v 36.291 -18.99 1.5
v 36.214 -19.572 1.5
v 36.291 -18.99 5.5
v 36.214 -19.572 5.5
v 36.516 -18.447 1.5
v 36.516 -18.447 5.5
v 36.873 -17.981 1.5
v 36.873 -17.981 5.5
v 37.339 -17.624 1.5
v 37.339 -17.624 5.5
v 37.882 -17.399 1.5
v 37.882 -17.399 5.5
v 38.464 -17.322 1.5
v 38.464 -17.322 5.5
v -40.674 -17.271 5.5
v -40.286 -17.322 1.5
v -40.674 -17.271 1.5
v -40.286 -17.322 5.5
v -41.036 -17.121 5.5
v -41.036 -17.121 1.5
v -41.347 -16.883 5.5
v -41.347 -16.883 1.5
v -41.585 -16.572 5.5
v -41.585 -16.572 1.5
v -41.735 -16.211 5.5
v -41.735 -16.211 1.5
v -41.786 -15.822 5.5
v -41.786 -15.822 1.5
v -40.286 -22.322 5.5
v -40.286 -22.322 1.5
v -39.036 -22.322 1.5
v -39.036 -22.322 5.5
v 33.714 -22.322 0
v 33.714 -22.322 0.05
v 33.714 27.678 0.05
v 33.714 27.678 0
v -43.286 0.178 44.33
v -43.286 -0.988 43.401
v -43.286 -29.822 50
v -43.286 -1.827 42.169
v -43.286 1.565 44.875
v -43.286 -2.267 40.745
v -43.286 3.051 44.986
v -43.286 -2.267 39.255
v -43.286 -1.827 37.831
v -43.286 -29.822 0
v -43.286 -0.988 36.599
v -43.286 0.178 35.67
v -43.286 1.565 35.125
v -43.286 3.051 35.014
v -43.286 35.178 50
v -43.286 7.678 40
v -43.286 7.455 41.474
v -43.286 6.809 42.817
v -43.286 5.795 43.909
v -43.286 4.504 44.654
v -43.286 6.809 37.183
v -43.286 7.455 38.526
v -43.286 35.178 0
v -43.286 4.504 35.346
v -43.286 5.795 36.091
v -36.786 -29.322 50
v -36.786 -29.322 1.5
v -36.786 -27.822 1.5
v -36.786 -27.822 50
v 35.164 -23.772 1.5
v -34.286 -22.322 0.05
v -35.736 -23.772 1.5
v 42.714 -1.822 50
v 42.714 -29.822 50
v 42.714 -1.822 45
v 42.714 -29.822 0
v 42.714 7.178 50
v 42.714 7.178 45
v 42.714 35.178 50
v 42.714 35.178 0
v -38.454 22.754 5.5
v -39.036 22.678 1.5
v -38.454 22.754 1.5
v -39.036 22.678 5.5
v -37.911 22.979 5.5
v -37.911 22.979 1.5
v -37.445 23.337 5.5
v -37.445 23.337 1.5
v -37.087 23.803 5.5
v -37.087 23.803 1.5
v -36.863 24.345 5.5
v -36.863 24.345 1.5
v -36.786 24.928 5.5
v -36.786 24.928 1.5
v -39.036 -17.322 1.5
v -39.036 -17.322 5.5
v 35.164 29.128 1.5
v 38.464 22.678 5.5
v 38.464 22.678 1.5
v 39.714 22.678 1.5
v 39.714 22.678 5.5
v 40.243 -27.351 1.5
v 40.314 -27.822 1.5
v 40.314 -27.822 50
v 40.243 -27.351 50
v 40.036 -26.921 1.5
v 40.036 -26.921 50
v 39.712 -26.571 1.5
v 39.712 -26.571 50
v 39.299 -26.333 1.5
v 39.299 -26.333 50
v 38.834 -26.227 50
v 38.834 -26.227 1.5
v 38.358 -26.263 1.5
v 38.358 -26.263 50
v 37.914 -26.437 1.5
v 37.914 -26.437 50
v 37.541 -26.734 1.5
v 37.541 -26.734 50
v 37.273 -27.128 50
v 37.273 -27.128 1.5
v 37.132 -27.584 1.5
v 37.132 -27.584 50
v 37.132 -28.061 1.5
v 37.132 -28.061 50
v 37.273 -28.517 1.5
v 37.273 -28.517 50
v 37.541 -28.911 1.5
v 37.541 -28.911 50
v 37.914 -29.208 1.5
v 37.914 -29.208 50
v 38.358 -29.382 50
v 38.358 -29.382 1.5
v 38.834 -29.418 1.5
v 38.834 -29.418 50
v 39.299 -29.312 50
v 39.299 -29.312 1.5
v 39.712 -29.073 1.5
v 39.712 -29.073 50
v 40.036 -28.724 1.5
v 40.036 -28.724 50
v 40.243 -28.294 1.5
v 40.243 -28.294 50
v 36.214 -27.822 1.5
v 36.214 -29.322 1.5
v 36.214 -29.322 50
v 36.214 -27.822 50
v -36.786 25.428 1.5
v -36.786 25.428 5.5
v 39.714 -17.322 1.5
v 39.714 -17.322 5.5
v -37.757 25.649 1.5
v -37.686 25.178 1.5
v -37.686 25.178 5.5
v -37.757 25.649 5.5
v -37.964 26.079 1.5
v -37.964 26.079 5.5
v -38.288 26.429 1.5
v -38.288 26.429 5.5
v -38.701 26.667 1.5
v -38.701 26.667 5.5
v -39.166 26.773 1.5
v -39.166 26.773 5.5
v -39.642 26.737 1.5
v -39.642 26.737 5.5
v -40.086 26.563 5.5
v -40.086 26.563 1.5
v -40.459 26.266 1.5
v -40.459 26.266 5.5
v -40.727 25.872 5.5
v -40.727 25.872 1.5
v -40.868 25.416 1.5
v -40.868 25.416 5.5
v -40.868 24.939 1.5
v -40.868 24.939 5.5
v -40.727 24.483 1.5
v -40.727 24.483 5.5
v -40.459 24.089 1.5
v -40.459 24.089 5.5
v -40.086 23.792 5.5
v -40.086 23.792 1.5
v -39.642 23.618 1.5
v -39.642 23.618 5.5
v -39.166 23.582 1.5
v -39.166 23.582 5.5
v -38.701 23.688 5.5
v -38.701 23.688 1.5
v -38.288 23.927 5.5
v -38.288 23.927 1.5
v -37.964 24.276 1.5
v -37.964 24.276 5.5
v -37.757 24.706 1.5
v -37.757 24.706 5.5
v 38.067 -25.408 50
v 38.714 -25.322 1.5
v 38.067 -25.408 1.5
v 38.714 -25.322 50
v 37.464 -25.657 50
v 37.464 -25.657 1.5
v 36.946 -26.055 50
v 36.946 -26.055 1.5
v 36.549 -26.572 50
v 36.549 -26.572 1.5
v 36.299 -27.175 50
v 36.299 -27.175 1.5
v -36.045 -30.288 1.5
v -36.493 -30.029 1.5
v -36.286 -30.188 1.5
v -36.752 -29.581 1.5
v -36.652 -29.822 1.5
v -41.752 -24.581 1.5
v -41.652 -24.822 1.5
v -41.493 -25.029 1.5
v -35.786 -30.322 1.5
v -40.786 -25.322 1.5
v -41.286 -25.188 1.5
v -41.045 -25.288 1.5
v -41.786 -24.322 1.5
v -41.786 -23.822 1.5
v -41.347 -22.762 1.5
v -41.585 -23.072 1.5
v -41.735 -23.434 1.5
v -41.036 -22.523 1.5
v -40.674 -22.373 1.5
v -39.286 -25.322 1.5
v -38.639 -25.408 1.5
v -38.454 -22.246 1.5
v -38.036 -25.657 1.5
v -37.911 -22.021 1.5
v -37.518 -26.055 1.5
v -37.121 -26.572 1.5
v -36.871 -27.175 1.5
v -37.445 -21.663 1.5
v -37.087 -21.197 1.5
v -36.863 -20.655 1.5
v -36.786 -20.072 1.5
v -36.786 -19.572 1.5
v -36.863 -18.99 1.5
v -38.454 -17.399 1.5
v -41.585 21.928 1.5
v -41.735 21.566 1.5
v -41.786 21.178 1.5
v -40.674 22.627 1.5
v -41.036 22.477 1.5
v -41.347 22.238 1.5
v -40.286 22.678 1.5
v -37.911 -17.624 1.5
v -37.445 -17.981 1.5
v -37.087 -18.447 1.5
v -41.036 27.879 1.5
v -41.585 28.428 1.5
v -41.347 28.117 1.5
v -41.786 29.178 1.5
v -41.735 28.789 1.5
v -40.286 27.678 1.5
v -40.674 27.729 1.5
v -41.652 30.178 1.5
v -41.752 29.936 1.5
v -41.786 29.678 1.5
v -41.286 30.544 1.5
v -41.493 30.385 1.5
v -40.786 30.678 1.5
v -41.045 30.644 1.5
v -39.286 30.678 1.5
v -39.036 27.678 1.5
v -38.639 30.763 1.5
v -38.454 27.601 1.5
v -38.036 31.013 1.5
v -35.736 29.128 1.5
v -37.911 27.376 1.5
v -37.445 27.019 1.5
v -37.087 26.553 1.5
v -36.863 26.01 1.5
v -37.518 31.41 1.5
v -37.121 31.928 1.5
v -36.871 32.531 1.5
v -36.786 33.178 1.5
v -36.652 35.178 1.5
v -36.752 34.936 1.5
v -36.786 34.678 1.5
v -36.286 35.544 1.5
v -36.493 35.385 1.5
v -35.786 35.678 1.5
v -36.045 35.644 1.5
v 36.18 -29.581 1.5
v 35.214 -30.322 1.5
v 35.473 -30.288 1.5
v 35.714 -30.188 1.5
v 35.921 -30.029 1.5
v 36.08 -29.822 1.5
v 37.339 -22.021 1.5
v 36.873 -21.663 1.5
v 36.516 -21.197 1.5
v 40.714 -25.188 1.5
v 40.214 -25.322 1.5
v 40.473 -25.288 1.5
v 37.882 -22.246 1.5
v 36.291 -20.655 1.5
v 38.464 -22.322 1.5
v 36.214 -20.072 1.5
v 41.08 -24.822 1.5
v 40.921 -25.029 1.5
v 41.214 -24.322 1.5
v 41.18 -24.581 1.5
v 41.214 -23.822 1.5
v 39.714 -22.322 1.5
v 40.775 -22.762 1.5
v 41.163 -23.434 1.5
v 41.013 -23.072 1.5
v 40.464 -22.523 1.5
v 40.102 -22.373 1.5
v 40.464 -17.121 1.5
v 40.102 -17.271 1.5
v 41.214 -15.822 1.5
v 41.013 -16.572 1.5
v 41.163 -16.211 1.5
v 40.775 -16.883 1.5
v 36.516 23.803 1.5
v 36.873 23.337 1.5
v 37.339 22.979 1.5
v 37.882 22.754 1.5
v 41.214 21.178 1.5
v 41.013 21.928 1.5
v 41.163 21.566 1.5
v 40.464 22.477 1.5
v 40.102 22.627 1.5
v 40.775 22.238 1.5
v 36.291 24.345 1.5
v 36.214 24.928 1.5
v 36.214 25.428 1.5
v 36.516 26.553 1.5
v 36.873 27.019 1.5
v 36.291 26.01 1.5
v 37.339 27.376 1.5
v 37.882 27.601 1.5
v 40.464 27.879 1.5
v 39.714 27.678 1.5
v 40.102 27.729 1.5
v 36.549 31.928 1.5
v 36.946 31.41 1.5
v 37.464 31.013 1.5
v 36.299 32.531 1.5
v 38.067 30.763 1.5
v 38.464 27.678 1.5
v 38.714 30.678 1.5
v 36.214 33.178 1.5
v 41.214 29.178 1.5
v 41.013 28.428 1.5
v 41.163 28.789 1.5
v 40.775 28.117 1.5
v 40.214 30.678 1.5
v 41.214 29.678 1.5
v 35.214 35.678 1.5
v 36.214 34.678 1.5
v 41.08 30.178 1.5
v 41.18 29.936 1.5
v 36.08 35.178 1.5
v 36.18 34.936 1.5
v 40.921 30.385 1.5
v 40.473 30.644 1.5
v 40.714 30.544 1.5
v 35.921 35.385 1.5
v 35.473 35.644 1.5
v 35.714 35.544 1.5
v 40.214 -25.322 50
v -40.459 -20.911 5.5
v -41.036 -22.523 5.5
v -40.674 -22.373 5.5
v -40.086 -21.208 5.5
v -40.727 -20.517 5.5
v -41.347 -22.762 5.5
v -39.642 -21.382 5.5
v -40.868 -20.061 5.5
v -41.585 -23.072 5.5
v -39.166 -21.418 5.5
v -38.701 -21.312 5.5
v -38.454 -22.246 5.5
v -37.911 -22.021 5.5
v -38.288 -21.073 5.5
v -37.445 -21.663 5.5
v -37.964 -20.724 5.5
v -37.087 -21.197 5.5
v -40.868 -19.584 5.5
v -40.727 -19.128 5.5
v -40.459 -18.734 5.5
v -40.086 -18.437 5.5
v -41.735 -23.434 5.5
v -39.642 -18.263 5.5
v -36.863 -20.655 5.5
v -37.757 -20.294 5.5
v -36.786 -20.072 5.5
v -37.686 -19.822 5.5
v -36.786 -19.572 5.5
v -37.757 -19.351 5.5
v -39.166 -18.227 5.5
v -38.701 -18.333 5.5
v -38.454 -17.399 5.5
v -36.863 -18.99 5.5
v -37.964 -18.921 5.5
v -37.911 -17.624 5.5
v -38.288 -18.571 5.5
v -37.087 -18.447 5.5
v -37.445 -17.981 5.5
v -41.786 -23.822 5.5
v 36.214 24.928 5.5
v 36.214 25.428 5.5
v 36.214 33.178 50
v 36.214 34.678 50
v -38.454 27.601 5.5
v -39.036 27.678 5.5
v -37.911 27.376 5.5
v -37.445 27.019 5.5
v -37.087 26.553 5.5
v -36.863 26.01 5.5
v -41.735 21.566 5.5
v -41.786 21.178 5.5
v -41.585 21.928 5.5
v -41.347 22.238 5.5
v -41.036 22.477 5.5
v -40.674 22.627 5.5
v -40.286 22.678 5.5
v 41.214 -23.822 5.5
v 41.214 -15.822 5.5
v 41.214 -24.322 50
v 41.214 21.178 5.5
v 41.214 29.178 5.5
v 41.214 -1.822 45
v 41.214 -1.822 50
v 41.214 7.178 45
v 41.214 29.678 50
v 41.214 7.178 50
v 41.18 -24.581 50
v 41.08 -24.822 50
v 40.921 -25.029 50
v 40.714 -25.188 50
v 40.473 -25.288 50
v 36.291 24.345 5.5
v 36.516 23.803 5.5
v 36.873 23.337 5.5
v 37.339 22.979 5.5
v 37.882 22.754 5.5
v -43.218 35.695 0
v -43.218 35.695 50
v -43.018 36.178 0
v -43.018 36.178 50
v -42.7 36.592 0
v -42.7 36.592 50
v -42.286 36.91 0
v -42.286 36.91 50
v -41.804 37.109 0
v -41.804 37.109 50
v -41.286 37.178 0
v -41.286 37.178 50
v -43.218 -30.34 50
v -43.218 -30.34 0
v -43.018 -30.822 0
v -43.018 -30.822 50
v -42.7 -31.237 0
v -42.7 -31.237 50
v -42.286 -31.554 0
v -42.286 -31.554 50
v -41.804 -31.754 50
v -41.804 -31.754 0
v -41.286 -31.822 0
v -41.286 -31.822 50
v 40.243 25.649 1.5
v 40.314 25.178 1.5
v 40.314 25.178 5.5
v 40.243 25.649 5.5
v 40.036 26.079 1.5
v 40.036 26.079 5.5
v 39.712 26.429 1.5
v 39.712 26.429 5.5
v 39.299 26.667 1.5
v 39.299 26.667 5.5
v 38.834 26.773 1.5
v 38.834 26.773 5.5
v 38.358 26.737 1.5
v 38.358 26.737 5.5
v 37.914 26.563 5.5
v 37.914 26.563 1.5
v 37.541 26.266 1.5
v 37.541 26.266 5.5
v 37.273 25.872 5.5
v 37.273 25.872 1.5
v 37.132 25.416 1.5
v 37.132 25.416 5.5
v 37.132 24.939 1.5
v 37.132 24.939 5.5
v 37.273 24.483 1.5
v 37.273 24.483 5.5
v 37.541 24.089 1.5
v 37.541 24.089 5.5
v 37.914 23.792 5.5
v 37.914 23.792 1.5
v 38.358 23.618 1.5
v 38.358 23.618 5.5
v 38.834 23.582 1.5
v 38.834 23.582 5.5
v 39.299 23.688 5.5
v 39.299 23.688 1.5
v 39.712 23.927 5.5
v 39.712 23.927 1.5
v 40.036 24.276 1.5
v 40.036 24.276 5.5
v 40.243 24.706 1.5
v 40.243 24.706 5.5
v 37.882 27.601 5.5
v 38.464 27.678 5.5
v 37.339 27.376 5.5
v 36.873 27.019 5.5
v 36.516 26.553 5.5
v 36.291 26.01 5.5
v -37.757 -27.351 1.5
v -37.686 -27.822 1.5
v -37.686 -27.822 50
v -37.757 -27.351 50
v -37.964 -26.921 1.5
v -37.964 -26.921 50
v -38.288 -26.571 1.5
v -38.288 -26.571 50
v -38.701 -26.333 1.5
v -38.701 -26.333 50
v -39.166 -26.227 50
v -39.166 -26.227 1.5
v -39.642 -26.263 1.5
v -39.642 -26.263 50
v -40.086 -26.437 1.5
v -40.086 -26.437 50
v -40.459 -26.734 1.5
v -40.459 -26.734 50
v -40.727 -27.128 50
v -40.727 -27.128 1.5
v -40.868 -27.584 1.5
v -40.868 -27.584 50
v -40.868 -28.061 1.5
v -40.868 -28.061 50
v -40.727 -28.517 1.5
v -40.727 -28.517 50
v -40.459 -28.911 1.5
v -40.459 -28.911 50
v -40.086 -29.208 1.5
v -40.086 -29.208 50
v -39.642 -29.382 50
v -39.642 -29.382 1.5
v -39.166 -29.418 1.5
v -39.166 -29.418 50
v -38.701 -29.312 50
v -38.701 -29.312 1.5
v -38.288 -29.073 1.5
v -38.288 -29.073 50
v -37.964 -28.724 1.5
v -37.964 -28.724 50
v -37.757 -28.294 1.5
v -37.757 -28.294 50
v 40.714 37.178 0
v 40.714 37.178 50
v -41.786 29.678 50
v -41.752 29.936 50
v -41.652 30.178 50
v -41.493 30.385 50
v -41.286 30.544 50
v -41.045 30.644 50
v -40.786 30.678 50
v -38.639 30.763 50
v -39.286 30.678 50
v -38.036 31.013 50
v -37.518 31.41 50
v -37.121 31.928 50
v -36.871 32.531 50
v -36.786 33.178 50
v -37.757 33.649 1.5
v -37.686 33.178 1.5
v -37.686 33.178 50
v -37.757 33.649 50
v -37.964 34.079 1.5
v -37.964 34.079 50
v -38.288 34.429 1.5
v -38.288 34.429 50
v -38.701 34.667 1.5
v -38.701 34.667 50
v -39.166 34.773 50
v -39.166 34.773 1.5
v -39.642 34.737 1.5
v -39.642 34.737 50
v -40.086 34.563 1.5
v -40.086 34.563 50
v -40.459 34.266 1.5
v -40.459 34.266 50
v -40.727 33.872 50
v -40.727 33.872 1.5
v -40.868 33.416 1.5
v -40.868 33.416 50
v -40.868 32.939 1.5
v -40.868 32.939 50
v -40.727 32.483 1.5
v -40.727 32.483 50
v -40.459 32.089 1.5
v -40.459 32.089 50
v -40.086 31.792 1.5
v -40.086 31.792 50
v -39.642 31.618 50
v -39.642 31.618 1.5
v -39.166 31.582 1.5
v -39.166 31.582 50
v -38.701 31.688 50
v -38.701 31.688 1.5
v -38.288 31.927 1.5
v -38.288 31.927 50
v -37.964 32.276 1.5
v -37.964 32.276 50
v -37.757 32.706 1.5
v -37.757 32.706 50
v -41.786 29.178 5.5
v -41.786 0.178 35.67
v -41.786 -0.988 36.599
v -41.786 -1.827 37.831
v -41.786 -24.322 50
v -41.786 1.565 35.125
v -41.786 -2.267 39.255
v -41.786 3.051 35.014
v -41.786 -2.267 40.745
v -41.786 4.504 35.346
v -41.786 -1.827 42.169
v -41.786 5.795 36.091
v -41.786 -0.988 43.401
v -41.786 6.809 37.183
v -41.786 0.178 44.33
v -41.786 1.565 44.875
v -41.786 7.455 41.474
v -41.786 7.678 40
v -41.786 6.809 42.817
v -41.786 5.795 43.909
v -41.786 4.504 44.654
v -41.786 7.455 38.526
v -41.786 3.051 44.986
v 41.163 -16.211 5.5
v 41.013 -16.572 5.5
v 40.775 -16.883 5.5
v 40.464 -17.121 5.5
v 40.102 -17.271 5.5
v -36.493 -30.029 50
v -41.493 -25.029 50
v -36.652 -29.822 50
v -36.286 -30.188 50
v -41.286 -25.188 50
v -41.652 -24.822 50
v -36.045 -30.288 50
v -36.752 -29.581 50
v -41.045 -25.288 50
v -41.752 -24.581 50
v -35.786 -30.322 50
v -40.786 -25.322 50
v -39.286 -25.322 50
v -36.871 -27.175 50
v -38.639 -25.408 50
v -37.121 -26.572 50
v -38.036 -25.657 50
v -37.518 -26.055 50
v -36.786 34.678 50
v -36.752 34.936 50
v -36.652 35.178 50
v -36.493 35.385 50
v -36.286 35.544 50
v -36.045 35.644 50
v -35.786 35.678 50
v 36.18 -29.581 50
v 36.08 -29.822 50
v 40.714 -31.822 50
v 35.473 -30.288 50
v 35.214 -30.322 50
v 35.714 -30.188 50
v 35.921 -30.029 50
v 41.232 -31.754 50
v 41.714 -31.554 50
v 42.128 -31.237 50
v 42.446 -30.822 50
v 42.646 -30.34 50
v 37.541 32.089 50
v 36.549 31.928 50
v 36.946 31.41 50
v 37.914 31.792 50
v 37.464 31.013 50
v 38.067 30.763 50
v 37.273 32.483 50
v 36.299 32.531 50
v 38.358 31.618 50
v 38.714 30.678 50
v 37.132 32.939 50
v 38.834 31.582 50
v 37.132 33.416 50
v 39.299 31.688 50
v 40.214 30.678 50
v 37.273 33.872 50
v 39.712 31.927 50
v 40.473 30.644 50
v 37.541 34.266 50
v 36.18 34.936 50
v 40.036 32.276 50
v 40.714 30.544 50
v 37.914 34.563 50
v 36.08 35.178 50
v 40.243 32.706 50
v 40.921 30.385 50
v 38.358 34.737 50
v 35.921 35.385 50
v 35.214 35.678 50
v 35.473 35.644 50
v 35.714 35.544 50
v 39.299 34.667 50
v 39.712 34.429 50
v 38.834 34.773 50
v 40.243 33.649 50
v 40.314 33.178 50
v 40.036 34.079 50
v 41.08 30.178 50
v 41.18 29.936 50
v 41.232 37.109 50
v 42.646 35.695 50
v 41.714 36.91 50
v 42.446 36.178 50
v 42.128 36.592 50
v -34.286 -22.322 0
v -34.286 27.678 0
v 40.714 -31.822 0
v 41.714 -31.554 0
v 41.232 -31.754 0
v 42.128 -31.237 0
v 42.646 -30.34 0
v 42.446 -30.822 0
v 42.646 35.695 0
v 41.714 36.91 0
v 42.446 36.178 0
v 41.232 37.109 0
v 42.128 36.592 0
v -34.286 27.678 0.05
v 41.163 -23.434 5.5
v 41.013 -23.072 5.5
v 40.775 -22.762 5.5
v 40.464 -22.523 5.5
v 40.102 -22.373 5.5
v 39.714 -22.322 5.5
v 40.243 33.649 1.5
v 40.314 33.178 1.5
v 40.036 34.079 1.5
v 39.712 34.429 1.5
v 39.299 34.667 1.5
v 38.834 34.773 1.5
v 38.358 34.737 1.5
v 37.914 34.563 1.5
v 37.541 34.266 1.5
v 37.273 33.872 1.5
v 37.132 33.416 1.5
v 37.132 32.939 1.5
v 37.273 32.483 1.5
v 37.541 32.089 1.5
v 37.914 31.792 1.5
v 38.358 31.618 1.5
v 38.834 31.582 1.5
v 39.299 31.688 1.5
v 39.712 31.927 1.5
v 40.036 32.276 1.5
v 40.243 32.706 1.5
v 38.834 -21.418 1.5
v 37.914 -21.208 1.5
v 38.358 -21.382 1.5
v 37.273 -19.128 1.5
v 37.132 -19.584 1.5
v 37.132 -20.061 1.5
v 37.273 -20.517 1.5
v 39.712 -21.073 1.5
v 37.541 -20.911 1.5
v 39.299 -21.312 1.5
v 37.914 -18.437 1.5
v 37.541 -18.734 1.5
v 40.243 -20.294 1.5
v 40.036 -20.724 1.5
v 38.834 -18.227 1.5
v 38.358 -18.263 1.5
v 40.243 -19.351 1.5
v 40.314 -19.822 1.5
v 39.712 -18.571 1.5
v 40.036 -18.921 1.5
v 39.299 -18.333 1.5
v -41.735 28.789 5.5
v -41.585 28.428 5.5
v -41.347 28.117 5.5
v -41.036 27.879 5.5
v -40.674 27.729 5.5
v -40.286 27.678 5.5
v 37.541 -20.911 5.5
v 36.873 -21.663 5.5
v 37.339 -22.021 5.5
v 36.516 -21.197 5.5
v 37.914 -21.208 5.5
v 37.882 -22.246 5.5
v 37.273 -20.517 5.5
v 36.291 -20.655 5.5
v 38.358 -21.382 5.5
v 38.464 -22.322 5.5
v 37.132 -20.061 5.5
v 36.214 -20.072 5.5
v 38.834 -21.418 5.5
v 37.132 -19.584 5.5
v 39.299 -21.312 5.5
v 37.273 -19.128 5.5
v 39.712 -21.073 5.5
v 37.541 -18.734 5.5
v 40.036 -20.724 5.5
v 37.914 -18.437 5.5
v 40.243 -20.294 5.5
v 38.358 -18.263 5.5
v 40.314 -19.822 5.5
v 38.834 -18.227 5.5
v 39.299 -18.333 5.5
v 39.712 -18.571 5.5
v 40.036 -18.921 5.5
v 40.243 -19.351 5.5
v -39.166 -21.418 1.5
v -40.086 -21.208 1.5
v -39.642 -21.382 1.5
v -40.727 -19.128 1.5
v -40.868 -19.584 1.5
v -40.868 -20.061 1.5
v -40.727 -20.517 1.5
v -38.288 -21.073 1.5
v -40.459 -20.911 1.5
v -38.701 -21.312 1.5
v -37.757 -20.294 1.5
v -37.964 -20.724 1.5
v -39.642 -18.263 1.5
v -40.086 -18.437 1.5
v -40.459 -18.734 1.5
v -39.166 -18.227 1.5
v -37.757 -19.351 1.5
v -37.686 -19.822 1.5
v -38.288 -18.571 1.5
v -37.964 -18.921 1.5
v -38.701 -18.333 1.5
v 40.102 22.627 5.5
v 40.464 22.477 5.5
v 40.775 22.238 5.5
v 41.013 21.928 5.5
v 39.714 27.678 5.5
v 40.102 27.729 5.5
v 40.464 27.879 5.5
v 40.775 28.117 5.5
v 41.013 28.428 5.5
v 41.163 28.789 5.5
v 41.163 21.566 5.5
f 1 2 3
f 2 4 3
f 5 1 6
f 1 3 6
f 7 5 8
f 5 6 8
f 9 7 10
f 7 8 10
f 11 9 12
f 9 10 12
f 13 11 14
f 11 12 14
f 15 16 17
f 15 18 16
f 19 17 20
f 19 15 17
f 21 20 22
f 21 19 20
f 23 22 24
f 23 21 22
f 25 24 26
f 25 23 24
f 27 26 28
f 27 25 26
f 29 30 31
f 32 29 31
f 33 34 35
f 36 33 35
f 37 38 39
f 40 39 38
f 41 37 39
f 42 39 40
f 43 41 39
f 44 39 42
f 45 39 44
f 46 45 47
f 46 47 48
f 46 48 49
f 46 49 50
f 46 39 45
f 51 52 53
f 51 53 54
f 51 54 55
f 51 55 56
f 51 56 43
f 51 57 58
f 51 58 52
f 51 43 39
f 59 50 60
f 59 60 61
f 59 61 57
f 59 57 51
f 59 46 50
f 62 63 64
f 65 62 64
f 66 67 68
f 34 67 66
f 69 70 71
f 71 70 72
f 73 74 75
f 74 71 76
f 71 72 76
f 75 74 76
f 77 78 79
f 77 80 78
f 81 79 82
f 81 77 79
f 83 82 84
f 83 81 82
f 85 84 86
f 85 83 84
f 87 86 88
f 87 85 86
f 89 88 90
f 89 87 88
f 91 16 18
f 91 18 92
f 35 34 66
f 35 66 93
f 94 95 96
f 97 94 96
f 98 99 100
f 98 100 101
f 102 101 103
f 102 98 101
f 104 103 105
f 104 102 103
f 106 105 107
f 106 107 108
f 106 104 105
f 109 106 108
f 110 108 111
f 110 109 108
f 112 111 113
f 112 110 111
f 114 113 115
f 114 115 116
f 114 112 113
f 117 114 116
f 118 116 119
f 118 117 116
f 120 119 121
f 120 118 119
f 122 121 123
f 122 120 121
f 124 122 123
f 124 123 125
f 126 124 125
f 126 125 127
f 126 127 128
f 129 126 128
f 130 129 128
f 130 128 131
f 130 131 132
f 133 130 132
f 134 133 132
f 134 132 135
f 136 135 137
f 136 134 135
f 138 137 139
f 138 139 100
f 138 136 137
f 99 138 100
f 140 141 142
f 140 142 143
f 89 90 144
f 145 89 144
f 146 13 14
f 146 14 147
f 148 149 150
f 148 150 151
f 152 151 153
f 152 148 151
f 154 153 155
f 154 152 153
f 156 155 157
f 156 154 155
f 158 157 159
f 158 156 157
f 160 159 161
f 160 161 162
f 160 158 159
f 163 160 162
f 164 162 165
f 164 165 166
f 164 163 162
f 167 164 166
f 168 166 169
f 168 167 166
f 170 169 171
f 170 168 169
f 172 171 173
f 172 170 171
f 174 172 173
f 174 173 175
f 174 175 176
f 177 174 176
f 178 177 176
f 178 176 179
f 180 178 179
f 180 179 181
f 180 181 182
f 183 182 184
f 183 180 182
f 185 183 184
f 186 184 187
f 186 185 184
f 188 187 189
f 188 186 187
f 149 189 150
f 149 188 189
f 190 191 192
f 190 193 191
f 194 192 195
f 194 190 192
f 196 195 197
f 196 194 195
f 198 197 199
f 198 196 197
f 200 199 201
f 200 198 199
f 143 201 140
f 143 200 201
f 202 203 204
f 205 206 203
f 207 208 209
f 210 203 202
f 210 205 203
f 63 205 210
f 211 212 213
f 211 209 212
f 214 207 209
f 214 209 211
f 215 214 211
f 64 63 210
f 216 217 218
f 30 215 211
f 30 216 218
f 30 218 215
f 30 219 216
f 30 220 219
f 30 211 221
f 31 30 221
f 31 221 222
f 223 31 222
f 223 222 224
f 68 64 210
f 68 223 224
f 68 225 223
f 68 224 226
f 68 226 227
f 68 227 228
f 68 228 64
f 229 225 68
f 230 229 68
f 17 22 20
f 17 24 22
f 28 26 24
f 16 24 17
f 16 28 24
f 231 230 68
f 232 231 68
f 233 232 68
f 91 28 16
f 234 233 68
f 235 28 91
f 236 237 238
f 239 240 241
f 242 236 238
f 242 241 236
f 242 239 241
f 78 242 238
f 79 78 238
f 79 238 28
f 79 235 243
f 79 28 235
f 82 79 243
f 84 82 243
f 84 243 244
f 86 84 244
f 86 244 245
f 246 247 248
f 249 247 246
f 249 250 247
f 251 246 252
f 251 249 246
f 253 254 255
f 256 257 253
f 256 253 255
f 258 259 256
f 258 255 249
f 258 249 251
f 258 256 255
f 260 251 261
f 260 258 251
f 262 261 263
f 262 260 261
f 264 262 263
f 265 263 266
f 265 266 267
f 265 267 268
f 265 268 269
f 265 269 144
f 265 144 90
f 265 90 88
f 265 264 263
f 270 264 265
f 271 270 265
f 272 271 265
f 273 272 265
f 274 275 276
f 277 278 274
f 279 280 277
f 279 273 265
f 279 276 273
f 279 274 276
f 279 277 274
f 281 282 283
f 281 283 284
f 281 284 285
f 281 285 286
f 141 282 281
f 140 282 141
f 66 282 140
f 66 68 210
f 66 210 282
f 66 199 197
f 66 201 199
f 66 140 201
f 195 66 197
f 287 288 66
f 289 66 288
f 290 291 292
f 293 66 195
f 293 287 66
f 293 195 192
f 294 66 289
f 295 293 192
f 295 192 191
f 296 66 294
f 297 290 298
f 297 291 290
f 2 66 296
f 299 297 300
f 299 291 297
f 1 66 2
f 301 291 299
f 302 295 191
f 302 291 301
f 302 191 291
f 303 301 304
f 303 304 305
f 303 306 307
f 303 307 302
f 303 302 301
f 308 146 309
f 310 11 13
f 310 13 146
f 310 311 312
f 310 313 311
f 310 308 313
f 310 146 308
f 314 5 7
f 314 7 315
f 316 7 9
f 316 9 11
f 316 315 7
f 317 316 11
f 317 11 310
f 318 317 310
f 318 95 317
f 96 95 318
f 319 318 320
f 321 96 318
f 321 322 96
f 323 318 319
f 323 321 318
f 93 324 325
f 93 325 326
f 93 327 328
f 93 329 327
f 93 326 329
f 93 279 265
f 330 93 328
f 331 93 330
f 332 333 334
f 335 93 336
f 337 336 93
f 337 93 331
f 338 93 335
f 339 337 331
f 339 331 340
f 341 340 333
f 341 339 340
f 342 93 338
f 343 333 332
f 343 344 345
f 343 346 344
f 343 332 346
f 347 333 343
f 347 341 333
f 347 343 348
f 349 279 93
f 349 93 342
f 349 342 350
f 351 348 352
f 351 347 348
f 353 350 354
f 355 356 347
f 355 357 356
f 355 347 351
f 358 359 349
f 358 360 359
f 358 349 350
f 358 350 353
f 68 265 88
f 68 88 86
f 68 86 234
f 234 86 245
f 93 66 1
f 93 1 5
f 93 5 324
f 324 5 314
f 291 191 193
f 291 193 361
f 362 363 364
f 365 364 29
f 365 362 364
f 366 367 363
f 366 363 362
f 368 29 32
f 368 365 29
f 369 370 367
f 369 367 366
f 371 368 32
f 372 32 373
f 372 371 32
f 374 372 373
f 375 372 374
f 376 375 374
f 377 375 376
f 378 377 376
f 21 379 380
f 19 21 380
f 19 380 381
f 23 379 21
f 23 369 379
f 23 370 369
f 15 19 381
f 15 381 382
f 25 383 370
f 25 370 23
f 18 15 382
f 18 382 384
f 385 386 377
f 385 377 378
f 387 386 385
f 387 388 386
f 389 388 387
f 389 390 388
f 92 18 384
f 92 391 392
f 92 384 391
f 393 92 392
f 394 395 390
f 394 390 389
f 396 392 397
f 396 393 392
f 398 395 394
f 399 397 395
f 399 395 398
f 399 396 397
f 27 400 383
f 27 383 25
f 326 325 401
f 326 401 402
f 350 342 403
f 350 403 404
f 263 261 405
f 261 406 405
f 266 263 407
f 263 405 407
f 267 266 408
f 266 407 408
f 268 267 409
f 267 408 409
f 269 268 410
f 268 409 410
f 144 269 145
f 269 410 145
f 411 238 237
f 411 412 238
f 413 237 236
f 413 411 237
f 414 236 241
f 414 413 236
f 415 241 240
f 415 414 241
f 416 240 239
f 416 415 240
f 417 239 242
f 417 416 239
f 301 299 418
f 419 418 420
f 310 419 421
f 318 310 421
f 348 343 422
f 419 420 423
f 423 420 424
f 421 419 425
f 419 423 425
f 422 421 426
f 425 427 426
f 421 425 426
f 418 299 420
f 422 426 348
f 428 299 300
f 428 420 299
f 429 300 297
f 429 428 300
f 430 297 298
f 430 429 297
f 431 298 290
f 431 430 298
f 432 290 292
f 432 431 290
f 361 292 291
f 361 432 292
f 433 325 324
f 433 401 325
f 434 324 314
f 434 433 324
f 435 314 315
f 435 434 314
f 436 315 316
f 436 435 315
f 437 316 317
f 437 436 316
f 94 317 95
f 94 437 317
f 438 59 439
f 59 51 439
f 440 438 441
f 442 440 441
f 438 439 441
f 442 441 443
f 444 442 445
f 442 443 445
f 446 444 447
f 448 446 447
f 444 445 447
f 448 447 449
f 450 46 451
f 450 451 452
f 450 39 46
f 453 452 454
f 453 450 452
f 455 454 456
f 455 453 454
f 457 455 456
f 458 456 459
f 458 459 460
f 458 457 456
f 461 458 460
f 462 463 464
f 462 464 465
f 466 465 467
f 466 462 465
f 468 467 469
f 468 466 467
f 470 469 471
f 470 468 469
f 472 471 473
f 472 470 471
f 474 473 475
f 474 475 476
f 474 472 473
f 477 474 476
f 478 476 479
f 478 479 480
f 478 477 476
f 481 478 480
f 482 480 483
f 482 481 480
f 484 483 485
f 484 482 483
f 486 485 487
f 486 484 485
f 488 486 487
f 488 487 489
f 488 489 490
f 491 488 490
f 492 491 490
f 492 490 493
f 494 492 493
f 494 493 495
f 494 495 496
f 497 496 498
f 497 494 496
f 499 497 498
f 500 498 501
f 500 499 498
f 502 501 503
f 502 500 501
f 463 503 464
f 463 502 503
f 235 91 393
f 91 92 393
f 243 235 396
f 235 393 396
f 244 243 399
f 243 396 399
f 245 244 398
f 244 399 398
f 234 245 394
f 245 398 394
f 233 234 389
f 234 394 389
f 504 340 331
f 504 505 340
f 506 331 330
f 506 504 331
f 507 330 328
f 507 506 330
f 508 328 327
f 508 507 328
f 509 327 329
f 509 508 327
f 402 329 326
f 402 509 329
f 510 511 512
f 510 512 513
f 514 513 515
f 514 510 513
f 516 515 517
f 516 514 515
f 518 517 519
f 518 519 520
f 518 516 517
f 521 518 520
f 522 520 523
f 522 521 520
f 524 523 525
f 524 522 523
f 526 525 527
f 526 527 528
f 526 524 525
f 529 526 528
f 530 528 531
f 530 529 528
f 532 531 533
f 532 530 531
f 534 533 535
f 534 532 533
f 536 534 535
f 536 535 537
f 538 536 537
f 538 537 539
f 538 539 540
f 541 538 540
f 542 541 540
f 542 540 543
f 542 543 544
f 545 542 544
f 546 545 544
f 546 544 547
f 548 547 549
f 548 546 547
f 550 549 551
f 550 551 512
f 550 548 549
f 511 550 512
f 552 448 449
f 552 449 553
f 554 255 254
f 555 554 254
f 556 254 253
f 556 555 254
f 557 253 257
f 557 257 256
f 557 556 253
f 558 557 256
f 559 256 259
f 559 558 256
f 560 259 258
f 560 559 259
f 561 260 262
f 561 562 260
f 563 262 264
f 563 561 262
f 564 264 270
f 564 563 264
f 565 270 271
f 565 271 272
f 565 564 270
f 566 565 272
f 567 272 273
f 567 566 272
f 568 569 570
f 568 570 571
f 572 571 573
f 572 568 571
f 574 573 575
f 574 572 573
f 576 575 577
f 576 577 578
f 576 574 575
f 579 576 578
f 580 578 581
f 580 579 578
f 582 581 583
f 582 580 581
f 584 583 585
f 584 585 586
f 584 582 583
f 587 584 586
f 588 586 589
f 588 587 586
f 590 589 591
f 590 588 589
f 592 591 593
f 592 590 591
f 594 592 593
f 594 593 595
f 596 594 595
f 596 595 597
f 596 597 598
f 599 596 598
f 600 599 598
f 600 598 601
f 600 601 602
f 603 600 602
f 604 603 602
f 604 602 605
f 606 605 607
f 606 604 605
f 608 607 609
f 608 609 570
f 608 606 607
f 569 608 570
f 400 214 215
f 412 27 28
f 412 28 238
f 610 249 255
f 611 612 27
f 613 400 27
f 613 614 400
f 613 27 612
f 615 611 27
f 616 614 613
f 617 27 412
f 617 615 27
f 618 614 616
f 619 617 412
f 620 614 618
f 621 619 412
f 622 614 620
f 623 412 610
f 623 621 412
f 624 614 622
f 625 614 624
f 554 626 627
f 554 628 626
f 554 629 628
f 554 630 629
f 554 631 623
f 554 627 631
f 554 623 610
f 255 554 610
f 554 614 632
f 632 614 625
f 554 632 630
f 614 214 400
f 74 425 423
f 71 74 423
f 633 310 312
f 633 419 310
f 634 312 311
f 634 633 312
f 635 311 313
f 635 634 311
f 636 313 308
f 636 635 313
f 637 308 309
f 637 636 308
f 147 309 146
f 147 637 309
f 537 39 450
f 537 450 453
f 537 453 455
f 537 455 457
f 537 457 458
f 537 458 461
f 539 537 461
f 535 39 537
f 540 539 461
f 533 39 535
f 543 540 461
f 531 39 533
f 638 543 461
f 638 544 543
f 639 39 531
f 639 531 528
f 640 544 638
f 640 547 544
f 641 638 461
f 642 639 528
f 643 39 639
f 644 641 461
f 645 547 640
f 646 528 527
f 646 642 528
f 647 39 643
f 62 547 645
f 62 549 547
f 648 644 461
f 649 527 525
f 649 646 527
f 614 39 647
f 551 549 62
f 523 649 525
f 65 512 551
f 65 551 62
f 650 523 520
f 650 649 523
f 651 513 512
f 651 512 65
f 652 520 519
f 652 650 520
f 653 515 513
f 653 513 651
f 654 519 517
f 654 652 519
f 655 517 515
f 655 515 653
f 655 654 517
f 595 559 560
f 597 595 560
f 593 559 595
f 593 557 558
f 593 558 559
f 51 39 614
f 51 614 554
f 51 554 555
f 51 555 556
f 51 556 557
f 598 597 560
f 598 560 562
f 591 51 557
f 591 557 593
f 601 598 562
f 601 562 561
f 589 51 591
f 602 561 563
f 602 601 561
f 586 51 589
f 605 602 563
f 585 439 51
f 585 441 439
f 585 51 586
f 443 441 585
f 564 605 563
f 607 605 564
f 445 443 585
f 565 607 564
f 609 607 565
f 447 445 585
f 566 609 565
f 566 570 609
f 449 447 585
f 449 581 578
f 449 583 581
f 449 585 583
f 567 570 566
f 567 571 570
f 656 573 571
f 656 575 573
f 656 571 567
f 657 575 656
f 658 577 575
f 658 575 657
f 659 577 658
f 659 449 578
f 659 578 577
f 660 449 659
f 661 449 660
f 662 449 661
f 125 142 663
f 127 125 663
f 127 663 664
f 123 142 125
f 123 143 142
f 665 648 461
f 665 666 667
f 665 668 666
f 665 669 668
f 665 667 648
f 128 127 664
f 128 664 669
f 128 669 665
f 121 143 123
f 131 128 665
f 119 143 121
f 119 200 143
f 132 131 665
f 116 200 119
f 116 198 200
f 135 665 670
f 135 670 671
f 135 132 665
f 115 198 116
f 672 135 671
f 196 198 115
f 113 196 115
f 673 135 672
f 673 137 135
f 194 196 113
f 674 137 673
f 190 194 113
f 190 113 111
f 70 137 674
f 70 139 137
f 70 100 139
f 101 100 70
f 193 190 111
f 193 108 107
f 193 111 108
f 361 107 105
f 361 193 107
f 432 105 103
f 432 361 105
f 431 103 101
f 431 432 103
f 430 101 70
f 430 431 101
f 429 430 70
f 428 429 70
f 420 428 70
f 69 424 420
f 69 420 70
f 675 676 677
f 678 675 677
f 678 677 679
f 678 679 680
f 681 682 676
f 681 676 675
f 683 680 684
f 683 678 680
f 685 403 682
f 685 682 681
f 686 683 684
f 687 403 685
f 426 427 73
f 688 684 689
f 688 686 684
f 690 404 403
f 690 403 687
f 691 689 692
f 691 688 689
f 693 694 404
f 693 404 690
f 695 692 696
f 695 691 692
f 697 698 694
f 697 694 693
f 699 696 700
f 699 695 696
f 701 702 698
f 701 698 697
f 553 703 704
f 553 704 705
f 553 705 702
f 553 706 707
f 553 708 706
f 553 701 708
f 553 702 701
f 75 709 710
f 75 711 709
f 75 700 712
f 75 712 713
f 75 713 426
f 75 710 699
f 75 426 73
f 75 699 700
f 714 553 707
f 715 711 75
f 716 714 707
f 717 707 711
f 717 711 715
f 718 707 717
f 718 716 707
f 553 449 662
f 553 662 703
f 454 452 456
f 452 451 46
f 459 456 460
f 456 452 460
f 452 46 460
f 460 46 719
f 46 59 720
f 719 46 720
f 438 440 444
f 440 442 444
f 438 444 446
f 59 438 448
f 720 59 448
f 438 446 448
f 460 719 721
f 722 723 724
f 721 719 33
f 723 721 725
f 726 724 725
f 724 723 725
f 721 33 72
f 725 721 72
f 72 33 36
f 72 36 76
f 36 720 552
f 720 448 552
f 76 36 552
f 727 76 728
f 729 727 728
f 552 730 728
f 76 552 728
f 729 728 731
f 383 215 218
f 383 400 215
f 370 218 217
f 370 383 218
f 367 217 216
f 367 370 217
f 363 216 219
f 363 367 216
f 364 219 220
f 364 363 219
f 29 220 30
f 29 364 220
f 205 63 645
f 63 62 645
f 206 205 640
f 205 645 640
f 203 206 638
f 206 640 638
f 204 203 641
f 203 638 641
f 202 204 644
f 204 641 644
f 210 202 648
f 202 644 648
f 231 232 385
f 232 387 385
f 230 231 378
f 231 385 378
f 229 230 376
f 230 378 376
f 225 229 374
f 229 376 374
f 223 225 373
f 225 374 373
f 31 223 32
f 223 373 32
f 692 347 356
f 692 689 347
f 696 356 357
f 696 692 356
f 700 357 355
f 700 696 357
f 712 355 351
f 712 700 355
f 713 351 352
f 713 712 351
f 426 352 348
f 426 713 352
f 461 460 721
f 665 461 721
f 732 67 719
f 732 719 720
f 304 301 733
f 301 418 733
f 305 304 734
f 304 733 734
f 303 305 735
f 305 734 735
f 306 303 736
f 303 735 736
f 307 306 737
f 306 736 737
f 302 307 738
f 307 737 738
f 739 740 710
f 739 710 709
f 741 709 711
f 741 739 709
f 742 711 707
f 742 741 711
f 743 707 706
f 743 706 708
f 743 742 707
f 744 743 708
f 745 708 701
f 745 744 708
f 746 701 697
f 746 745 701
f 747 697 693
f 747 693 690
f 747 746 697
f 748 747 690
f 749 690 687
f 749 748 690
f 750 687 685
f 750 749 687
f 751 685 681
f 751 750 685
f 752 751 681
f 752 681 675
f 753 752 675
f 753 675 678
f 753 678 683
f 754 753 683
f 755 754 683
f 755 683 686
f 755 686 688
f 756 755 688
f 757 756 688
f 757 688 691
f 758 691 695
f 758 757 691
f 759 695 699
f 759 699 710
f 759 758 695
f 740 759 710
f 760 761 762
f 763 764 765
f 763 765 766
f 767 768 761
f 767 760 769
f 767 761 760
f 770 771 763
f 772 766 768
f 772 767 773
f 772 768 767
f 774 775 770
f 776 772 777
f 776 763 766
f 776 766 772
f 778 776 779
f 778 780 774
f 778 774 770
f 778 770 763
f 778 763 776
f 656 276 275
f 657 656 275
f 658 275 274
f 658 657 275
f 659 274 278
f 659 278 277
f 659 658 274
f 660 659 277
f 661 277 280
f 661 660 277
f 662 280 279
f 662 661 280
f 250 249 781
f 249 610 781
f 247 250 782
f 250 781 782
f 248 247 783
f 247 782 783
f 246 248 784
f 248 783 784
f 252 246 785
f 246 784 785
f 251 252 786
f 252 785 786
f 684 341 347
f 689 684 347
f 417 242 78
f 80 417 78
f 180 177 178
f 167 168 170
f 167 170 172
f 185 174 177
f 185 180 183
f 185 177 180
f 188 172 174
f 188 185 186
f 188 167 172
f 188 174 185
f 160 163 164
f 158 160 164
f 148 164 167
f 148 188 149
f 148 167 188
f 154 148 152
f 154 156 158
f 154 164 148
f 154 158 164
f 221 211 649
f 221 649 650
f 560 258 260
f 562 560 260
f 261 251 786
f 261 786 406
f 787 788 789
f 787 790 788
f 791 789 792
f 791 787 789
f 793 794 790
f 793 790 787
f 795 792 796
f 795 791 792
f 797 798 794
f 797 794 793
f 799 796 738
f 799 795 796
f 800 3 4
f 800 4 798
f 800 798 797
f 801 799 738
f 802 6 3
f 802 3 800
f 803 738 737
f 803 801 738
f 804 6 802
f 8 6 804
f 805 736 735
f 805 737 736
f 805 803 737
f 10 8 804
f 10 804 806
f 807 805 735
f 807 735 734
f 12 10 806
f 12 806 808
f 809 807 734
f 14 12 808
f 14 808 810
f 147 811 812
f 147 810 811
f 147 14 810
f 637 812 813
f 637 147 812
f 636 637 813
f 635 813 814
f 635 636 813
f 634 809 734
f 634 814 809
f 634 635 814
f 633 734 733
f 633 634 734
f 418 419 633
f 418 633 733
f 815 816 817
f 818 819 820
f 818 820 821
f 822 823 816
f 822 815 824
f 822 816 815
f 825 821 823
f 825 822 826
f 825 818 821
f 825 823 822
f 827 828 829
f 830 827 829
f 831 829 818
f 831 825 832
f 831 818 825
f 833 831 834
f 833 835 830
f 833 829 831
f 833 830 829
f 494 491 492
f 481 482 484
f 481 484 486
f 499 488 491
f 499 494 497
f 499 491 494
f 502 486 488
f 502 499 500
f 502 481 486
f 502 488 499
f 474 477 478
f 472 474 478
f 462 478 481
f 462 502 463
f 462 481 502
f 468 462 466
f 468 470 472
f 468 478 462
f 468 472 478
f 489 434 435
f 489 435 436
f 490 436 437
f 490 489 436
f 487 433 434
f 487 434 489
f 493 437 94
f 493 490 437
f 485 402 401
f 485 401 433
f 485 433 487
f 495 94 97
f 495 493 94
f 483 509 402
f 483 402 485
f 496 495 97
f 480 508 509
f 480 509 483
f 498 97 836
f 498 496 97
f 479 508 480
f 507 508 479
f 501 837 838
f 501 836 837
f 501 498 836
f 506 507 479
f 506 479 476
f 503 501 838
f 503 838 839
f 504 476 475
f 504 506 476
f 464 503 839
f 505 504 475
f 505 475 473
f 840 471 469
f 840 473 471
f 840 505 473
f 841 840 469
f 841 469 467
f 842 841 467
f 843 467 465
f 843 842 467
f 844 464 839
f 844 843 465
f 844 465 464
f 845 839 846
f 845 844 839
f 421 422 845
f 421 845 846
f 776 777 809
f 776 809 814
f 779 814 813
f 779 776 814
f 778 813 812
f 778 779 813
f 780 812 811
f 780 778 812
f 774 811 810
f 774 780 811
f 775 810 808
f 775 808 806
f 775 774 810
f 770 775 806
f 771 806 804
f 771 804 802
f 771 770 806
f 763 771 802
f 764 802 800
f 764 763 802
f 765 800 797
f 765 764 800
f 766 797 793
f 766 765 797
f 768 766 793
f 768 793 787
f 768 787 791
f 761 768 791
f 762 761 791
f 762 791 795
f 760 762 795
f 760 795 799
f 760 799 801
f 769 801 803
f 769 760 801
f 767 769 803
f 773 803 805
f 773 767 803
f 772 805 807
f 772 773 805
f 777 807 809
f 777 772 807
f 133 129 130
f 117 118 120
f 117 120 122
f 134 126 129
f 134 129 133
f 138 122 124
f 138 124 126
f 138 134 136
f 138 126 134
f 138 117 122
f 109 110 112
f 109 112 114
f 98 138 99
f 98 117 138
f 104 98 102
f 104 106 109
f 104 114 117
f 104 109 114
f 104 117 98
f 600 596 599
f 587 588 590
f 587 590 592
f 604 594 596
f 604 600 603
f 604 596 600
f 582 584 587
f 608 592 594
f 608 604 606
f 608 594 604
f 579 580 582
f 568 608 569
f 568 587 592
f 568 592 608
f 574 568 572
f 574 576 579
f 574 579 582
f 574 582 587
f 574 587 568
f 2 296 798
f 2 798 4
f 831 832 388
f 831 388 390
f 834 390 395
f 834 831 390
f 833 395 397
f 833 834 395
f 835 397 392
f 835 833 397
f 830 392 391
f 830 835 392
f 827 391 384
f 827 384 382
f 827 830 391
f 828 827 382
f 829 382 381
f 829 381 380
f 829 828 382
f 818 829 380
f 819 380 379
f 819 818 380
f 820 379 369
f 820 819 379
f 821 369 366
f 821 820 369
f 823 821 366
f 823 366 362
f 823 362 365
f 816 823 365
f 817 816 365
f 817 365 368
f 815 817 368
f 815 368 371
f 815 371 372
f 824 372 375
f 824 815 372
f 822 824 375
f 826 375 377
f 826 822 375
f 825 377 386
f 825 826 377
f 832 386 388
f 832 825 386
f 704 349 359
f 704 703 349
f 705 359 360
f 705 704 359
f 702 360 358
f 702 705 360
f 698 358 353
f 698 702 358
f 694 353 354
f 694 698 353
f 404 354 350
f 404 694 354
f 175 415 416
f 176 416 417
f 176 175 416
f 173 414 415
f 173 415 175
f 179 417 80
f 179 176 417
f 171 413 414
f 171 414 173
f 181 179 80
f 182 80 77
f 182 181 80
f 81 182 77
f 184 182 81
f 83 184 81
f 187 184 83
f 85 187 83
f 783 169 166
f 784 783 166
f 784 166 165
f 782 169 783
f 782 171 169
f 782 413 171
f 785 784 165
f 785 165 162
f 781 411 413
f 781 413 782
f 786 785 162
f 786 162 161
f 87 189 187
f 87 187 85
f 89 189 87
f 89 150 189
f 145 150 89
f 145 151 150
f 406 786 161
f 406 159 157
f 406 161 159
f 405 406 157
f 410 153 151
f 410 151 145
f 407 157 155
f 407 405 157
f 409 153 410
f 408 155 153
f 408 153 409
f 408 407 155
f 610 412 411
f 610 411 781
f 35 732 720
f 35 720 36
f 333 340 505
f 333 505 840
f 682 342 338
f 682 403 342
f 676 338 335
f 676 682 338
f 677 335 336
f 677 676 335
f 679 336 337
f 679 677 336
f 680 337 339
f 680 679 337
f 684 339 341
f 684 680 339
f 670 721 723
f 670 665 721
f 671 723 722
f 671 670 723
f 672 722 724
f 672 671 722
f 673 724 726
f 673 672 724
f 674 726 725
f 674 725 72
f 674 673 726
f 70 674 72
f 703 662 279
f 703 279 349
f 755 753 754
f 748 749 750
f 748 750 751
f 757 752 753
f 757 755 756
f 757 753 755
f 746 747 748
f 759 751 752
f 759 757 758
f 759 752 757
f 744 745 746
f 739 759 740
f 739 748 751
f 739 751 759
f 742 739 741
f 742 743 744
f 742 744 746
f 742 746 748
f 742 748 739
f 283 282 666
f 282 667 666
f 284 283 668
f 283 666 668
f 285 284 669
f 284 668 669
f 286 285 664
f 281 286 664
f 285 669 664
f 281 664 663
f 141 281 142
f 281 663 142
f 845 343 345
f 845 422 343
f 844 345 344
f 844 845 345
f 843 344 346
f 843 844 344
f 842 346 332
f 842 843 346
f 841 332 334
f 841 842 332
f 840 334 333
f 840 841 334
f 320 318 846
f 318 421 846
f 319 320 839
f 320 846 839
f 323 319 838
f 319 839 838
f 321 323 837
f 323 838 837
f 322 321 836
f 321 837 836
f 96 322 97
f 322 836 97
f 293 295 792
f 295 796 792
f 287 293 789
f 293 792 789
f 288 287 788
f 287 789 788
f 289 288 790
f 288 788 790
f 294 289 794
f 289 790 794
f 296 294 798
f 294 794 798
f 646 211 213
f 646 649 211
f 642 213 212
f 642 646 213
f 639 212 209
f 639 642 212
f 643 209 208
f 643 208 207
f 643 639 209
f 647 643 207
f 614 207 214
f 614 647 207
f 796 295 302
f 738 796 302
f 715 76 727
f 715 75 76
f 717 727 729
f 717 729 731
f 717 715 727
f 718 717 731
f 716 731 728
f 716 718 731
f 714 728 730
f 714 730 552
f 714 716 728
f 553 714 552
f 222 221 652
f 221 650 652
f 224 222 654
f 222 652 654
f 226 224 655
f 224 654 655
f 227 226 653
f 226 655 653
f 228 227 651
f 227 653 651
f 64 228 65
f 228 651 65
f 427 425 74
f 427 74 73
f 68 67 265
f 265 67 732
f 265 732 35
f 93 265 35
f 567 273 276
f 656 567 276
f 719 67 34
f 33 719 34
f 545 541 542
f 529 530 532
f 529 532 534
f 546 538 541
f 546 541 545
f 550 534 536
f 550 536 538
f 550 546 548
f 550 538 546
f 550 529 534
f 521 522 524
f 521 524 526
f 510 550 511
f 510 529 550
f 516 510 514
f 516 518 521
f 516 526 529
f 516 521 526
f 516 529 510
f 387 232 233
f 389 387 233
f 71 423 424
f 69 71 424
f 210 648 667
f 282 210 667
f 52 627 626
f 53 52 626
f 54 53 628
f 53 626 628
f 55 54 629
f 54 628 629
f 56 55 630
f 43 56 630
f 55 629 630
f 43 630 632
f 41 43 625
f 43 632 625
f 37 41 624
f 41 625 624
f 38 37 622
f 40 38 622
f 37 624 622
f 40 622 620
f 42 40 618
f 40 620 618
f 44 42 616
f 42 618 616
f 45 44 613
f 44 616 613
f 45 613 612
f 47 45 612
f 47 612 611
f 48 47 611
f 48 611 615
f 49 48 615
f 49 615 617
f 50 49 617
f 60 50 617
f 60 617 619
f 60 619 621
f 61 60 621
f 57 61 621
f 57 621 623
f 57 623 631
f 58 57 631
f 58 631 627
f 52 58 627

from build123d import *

# Parameters (mm, degrees)
SKETCH_W        = 86
SKETCH_H        = 69
PAD_DEPTH       = 50
SKETCH001_W     = 83
SKETCH001_H     = 66
POCKET_DEPTH    = 48.5
SKETCH002_W     = 68
SKETCH002_H     = 50
POCKET001_DEPTH = 5
SKETCH003_W     = 5
SKETCH003_H     = 5
SKETCH003_R     = 1.6
PAD001_DEPTH    = 4
FILLET_R        = 2.25
FILLET001_R     = 2.25
FILLET002_R     = 1.5
SKETCH004_W     = 5
SKETCH004_H     = 5
SKETCH004_R     = 1.6
PAD002_DEPTH    = 48.5
FILLET003_R     = 2.5
FILLET004_R     = 1
FILLET005_R     = 2
CHAMFER_SIZE    = 1.45
SKETCH006_R     = 5
POCKET002_DEPTH = 5
SKETCH007_W     = 9
SKETCH007_H     = 5
POCKET003_DEPTH = 5


with BuildPart() as part:
    # Sketch → Pad (new body)
    with BuildSketch(Plane.XY):
        with Locations((-0.285933, 2.677615)):
            Rectangle(SKETCH_W, SKETCH_H)
    extrude(amount=PAD_DEPTH)

    # Sketch001 (on Face6 of Pad) → Pocket (cut)
    with BuildSketch(Plane.XY.offset(50)):
        with Locations((-0.285933, 2.677615)):
            Rectangle(SKETCH001_W, SKETCH001_H)
    extrude(amount=-POCKET_DEPTH, mode=Mode.SUBTRACT)

    # Sketch002 (on Face11 of Pocket) → Pocket001 (cut)
    with BuildSketch(Plane.XY.offset(1.5)):
        with Locations((-0.285933, 2.677615)):
            Rectangle(SKETCH002_W, SKETCH002_H)
    extrude(amount=-POCKET001_DEPTH, mode=Mode.SUBTRACT)

    # Sketch003 (on Face15 of Pocket001) → Pad001 (join)
    with BuildSketch(Plane.XY.offset(1.5)):
        with Locations((-39.285933, -19.822385)):
            Rectangle(SKETCH003_W, SKETCH003_H)
        with Locations((-39.285933, -19.822385)):
            Circle(SKETCH003_R, mode=Mode.SUBTRACT)
        with Locations((38.714067, 25.177615)):
            Rectangle(SKETCH003_W, SKETCH003_H)
        with Locations((38.714067, 25.177615)):
            Circle(SKETCH003_R, mode=Mode.SUBTRACT)
        with Locations((38.714067, -19.822385)):
            Rectangle(SKETCH003_W, SKETCH003_H)
        with Locations((38.714054, -19.822398)):
            Circle(SKETCH003_R, mode=Mode.SUBTRACT)
        with Locations((-39.285933, 25.177615)):
            Rectangle(SKETCH003_W, SKETCH003_H)
        with Locations((-39.285933, 25.177615)):
            Circle(SKETCH003_R, mode=Mode.SUBTRACT)
    extrude(amount=PAD001_DEPTH)

    # Fillet
    fillet_edges = [part.edges().sort_by_distance(p)[0] for p in [
        (-36.785933, 27.677615, 3.5),
        (-36.785933, 22.677615, 3.5),
    ]]
    fillet(fillet_edges, radius=FILLET_R)

    # Fillet001
    fillet001_edges = [part.edges().sort_by_distance(p)[0] for p in [
        (-36.785933, -17.322385, 3.5),
        (-36.785933, -22.322385, 3.5),
        (36.214067, -17.322385, 3.5),
        (36.214067, -22.322385, 3.5),
        (36.214067, 27.677615, 3.5),
        (36.214067, 22.677615, 3.5),
    ]]
    fillet(fillet001_edges, radius=FILLET001_R)

    # Fillet002
    fillet002_edges = [part.edges().sort_by_distance(p)[0] for p in [
        (41.214067, 22.677615, 3.5),
        (41.214067, 27.677615, 3.5),
        (41.214067, -17.322385, 3.5),
        (41.214067, -22.322385, 3.5),
        (-41.785933, 22.677615, 3.5),
        (-41.785933, 27.677615, 3.5),
        (-41.785933, -17.322385, 3.5),
        (-41.785933, -22.322385, 3.5),
    ]]
    fillet(fillet002_edges, radius=FILLET002_R)

    # Sketch004 (on Face1 of Fillet002) → Pad002 (join)
    with BuildSketch(Plane.XY.offset(1.5)):
        with Locations((-39.285933, -27.822385)):
            Rectangle(SKETCH004_W, SKETCH004_H)
        with Locations((-39.285933, -27.822385)):
            Circle(SKETCH004_R, mode=Mode.SUBTRACT)
        with Locations((-39.285933, 33.177615)):
            Rectangle(SKETCH004_W, SKETCH004_H)
        with Locations((-39.285933, 33.177615)):
            Circle(SKETCH004_R, mode=Mode.SUBTRACT)
        with Locations((38.714067, 33.177615)):
            Rectangle(SKETCH004_W, SKETCH004_H)
        with Locations((38.714067, 33.177615)):
            Circle(SKETCH004_R, mode=Mode.SUBTRACT)
        with Locations((38.714067, -27.822385)):
            Rectangle(SKETCH004_W, SKETCH004_H)
        with Locations((38.714067, -27.822385)):
            Circle(SKETCH004_R, mode=Mode.SUBTRACT)
    extrude(amount=PAD002_DEPTH)

    # Fillet003
    fillet003_edges = [part.edges().sort_by_distance(p)[0] for p in [
        (-36.785933, 30.677615, 25.75),
        (36.214067, 30.677615, 25.75),
        (-36.785933, -25.322385, 25.75),
        (36.214067, -25.322385, 25.75),
    ]]
    fillet(fillet003_edges, radius=FILLET003_R)

    # Fillet004
    fillet004_edges = [part.edges().sort_by_distance(p)[0] for p in [
        (41.214067, -25.322385, 25.75),
        (36.214067, -30.322385, 25.75),
        (41.214067, 30.677615, 25.75),
        (36.214067, 35.677615, 25.75),
        (-41.785933, 30.677615, 25.75),
        (-36.785933, 35.677615, 25.75),
        (-36.785933, -30.322385, 25.75),
        (-41.785933, -25.322385, 25.75),
    ]]
    fillet(fillet004_edges, radius=FILLET004_R)

    # Fillet005
    fillet005_edges = [part.edges().sort_by_distance(p)[0] for p in [
        (-43.285933, 37.177615, 25),
        (42.714067, 37.177615, 25),
        (42.714067, -31.822385, 25),
        (-43.285933, -31.822385, 25),
    ]]
    fillet(fillet005_edges, radius=FILLET005_R)

    # Chamfer
    chamfer_edges = [part.edges().sort_by_distance(p)[0] for p in [
        (-34.285933, 2.677615, 1.5),
        (-0.285933, 27.677615, 1.5),
        (-0.285933, -22.322385, 1.5),
        (33.714067, 2.677615, 1.5),
    ]]
    chamfer(chamfer_edges, length=CHAMFER_SIZE)

    # Sketch006 (on Face13 of Fillet005) → Pocket002 (cut)
    with BuildSketch(Plane.YZ.offset(-41.785933)):
        with Locations((2.677615, 40)):
            Circle(SKETCH006_R)
    extrude(amount=-POCKET002_DEPTH, mode=Mode.SUBTRACT)

    # Sketch007 (on Face25 of Pocket002) → Pocket003 (cut)
    with BuildSketch(Plane(origin=(41.214067, 0, 0), x_dir=(0, -1, 0), z_dir=(-1, 0, 0))):
        with Locations((-2.677615, 47.5)):
            Rectangle(SKETCH007_W, SKETCH007_H)
    extrude(amount=-POCKET003_DEPTH, mode=Mode.SUBTRACT)


solid = part.part
